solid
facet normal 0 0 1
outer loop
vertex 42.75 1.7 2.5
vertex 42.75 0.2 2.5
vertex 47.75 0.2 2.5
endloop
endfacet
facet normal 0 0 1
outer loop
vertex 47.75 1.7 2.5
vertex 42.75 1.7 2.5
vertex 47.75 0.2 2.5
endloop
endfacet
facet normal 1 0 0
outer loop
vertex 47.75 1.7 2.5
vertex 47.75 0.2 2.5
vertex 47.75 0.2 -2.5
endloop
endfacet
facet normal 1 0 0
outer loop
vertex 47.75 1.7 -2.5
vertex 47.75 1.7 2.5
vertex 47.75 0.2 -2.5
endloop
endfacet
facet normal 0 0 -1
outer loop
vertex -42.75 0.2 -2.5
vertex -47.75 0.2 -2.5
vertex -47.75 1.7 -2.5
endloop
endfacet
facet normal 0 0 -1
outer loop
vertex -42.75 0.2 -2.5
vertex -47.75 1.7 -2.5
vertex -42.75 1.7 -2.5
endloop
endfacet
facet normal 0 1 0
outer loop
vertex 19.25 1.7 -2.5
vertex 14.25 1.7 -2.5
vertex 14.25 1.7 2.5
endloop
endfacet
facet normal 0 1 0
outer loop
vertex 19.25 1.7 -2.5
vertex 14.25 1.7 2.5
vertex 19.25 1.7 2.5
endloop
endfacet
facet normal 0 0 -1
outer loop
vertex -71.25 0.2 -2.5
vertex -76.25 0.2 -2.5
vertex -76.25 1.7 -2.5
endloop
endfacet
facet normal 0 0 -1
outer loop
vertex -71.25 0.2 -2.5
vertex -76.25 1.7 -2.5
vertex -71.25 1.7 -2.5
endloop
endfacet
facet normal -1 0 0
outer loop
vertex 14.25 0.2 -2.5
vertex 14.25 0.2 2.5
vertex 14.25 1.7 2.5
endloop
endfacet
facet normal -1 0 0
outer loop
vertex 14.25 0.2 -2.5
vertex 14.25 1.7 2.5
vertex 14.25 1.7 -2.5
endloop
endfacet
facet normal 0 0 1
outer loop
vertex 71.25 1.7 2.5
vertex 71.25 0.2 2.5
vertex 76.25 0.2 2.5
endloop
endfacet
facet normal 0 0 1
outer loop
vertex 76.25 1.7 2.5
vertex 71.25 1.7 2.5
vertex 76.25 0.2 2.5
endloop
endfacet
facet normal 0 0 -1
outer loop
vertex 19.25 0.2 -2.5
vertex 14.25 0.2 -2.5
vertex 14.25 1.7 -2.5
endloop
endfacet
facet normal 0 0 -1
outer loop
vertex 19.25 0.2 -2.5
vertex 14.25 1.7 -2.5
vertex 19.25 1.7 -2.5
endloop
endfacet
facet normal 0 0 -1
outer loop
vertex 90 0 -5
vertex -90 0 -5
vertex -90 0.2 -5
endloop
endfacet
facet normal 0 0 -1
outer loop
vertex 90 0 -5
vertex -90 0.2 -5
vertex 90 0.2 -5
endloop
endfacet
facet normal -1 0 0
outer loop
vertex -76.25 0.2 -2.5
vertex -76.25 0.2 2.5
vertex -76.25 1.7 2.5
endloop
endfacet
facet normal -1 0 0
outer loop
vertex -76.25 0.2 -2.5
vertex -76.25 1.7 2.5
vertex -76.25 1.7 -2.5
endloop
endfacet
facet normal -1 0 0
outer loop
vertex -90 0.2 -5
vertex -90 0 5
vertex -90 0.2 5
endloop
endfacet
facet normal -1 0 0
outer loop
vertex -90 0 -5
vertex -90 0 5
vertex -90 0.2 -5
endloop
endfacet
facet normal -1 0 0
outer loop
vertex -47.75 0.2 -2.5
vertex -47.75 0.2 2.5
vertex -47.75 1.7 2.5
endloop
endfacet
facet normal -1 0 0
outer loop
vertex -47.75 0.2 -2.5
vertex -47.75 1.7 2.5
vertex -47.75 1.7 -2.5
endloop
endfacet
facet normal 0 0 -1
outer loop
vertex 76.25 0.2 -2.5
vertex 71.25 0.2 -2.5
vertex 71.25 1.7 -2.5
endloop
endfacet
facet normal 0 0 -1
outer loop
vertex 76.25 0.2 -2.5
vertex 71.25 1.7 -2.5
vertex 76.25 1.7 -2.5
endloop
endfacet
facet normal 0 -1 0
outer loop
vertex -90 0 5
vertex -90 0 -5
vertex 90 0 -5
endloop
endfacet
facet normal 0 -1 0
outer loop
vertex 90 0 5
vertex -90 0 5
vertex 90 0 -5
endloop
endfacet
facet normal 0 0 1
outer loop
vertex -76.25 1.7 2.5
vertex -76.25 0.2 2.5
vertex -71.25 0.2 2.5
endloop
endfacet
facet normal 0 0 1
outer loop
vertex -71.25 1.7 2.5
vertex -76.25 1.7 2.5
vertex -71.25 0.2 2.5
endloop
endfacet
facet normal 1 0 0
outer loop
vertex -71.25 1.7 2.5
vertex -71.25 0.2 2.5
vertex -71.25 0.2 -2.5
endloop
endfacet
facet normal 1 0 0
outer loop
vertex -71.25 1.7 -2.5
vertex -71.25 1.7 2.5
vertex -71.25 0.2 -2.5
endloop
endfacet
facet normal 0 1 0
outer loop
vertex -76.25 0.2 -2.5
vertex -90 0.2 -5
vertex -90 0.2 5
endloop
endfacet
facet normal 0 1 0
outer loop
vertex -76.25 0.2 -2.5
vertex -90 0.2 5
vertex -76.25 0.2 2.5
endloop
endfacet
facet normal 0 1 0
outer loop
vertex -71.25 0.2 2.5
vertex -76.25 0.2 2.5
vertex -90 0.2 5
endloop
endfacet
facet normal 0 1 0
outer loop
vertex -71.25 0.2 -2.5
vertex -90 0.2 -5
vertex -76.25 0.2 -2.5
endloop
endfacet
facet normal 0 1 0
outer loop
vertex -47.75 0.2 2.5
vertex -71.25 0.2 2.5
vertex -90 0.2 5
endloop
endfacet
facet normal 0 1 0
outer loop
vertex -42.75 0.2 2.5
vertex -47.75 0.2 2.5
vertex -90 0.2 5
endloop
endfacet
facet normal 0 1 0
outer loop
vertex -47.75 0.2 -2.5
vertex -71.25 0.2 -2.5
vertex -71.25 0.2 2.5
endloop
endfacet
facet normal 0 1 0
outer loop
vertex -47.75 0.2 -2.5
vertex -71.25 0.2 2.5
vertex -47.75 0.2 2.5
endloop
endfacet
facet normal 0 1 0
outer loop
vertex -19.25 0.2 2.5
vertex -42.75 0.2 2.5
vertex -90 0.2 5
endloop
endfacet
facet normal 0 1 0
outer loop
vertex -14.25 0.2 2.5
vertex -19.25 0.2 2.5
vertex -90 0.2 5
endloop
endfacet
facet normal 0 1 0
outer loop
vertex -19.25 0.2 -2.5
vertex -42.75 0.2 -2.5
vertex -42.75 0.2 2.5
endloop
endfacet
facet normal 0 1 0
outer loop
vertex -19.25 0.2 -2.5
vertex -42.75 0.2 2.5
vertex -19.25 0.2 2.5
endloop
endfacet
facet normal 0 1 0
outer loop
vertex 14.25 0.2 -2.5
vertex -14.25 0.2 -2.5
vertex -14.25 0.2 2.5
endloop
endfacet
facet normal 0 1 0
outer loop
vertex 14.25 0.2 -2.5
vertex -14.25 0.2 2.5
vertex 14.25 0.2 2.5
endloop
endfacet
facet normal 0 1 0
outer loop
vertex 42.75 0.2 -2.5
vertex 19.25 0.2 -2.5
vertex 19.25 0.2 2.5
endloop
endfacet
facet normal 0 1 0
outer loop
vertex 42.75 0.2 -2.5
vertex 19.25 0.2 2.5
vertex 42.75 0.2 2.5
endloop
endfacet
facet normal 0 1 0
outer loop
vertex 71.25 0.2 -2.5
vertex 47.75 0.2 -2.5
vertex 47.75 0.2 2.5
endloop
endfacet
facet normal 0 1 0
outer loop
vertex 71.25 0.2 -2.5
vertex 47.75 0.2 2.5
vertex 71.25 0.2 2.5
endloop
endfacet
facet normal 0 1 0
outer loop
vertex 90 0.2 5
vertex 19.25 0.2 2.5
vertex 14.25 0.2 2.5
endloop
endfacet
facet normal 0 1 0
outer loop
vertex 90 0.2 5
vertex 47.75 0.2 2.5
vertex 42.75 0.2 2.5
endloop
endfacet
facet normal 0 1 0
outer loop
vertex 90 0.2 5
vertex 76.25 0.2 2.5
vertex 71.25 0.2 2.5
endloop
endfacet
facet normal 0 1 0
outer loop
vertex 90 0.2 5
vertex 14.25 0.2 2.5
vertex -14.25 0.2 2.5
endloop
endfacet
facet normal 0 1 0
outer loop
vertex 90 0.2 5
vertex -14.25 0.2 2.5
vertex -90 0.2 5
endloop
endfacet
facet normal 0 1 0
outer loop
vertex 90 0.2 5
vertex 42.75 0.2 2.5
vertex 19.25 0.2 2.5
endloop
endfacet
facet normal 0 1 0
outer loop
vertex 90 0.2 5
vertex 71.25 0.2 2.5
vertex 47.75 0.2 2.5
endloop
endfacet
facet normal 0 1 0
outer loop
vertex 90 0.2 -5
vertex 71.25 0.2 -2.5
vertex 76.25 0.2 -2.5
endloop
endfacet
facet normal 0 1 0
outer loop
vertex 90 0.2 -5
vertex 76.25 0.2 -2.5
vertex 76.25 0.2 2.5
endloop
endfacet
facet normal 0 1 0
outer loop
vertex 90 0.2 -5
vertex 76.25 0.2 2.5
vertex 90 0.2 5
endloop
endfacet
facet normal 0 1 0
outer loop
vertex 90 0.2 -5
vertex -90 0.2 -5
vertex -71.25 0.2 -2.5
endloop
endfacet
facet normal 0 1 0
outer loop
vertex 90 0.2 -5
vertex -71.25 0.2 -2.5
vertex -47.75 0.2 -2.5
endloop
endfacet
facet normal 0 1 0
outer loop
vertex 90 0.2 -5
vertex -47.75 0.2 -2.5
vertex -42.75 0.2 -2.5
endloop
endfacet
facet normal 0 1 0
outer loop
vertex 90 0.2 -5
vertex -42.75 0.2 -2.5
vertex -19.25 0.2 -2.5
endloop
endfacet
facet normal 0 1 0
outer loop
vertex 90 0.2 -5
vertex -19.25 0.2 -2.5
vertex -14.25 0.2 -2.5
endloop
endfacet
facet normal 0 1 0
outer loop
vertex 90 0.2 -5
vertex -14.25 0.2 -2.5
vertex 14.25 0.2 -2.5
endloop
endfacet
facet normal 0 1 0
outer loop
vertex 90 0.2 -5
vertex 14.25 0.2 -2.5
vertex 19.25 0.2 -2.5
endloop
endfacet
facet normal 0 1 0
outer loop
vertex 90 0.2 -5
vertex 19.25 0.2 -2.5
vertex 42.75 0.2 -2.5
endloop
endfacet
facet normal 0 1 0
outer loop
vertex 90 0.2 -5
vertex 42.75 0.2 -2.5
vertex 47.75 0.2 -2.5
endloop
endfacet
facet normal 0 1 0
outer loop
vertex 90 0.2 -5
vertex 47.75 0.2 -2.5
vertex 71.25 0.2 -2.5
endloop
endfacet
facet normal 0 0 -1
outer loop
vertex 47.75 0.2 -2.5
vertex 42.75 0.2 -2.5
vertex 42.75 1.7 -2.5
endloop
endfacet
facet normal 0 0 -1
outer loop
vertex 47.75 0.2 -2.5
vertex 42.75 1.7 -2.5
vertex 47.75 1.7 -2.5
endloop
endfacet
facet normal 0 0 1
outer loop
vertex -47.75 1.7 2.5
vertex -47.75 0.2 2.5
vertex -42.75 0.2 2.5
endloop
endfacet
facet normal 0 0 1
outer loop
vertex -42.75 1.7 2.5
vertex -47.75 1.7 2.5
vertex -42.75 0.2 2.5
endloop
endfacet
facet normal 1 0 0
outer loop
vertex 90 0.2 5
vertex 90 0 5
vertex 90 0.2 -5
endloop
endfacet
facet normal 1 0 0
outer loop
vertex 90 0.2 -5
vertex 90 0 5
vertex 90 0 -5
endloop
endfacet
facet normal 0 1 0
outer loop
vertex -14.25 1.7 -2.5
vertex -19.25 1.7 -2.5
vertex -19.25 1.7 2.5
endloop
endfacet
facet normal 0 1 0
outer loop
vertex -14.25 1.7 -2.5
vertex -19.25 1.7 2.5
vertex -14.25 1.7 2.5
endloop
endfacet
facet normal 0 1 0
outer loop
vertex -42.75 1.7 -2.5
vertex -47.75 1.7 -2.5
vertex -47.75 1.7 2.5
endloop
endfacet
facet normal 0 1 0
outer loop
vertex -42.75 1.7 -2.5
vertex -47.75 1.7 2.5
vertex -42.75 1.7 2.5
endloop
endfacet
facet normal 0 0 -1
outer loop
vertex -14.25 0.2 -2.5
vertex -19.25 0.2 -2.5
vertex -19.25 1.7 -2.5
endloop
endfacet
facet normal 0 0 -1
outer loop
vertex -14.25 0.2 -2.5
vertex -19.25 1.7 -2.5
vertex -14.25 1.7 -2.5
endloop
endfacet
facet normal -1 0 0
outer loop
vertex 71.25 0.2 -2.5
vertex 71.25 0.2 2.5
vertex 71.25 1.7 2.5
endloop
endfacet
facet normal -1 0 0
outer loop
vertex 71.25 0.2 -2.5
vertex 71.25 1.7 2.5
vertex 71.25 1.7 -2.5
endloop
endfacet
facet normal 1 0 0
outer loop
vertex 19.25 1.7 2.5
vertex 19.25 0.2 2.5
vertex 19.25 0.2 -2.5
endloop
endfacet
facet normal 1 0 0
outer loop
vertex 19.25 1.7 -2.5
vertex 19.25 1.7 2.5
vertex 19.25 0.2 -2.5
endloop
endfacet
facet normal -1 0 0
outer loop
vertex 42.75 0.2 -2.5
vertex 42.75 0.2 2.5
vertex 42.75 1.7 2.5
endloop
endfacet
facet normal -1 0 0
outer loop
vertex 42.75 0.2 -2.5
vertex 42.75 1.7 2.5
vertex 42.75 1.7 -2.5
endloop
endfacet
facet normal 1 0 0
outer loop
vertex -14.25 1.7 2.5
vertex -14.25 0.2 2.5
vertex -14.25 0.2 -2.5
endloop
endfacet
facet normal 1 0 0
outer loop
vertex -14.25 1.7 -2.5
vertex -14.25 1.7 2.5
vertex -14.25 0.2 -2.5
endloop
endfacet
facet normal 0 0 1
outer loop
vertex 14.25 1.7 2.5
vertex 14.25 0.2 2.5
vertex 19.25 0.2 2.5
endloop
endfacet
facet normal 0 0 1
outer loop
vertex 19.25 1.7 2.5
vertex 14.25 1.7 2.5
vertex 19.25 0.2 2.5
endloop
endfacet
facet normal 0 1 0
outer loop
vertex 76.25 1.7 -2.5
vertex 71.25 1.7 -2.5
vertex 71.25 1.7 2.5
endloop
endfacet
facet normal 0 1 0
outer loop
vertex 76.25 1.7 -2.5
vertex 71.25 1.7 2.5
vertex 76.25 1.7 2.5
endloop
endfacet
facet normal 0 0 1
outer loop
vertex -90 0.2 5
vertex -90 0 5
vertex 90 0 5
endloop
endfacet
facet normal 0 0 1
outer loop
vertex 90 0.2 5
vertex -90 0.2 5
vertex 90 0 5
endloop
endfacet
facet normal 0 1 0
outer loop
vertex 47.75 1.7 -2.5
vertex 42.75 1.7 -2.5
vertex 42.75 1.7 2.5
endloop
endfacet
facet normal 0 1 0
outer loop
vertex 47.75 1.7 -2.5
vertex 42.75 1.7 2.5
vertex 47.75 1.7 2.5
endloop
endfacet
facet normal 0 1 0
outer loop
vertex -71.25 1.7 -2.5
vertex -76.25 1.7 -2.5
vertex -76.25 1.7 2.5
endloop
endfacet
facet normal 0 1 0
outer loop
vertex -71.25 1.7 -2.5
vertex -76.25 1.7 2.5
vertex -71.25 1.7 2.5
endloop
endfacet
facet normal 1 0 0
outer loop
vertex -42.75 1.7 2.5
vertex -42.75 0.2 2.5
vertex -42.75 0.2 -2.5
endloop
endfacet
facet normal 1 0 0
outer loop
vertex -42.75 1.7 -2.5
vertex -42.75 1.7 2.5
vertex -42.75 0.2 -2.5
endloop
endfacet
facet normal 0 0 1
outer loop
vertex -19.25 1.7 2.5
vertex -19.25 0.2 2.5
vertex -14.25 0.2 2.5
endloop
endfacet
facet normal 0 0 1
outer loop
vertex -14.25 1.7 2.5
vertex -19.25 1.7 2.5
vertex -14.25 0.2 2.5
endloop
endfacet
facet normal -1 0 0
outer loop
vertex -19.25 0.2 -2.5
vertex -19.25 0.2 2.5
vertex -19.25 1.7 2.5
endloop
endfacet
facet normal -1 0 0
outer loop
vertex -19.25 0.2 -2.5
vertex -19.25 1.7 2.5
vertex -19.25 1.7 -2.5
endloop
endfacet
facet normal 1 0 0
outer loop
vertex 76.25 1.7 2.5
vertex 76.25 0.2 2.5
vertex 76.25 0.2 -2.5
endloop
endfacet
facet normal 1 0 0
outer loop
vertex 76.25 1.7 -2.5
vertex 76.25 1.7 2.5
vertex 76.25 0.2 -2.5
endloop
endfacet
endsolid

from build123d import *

# Parameters (mm, degrees)
ESQUISSE1_W        = 180
ESQUISSE1_H        = 10
BOSS_EXTRU_1_DEPTH = 0.2
ESQUISSE3_W        = 5
ESQUISSE3_H        = 5
BOSS_EXTRU_2_DEPTH = 1.5


with BuildPart() as part:
    # Esquisse1 → Boss.-Extru.1 (new body)
    with BuildSketch(Plane(origin=(0, 0, 0), x_dir=(1, 0, 0), z_dir=(0, 1, 0))):
        Rectangle(ESQUISSE1_W, ESQUISSE1_H)
    extrude(amount=BOSS_EXTRU_1_DEPTH)

    # Esquisse3 → Boss.-Extru.2 (add)
    with BuildSketch(Plane(origin=(0, 0.2, 0), x_dir=(1, 0, 0), z_dir=(0, 1, 0))):
        with Locations((45.25, 0)):
            Rectangle(ESQUISSE3_W, ESQUISSE3_H)
        with Locations((16.75, 0)):
            Rectangle(ESQUISSE3_W, ESQUISSE3_H)
        with Locations((73.75, 0)):
            Rectangle(ESQUISSE3_W, ESQUISSE3_H)
        with Locations((-73.75, 0)):
            Rectangle(ESQUISSE3_W, ESQUISSE3_H)
        with Locations((-45.25, 0)):
            Rectangle(ESQUISSE3_W, ESQUISSE3_H)
        with Locations((-16.75, 0)):
            Rectangle(ESQUISSE3_W, ESQUISSE3_H)
    extrude(amount=BOSS_EXTRU_2_DEPTH)


solid = part.part
